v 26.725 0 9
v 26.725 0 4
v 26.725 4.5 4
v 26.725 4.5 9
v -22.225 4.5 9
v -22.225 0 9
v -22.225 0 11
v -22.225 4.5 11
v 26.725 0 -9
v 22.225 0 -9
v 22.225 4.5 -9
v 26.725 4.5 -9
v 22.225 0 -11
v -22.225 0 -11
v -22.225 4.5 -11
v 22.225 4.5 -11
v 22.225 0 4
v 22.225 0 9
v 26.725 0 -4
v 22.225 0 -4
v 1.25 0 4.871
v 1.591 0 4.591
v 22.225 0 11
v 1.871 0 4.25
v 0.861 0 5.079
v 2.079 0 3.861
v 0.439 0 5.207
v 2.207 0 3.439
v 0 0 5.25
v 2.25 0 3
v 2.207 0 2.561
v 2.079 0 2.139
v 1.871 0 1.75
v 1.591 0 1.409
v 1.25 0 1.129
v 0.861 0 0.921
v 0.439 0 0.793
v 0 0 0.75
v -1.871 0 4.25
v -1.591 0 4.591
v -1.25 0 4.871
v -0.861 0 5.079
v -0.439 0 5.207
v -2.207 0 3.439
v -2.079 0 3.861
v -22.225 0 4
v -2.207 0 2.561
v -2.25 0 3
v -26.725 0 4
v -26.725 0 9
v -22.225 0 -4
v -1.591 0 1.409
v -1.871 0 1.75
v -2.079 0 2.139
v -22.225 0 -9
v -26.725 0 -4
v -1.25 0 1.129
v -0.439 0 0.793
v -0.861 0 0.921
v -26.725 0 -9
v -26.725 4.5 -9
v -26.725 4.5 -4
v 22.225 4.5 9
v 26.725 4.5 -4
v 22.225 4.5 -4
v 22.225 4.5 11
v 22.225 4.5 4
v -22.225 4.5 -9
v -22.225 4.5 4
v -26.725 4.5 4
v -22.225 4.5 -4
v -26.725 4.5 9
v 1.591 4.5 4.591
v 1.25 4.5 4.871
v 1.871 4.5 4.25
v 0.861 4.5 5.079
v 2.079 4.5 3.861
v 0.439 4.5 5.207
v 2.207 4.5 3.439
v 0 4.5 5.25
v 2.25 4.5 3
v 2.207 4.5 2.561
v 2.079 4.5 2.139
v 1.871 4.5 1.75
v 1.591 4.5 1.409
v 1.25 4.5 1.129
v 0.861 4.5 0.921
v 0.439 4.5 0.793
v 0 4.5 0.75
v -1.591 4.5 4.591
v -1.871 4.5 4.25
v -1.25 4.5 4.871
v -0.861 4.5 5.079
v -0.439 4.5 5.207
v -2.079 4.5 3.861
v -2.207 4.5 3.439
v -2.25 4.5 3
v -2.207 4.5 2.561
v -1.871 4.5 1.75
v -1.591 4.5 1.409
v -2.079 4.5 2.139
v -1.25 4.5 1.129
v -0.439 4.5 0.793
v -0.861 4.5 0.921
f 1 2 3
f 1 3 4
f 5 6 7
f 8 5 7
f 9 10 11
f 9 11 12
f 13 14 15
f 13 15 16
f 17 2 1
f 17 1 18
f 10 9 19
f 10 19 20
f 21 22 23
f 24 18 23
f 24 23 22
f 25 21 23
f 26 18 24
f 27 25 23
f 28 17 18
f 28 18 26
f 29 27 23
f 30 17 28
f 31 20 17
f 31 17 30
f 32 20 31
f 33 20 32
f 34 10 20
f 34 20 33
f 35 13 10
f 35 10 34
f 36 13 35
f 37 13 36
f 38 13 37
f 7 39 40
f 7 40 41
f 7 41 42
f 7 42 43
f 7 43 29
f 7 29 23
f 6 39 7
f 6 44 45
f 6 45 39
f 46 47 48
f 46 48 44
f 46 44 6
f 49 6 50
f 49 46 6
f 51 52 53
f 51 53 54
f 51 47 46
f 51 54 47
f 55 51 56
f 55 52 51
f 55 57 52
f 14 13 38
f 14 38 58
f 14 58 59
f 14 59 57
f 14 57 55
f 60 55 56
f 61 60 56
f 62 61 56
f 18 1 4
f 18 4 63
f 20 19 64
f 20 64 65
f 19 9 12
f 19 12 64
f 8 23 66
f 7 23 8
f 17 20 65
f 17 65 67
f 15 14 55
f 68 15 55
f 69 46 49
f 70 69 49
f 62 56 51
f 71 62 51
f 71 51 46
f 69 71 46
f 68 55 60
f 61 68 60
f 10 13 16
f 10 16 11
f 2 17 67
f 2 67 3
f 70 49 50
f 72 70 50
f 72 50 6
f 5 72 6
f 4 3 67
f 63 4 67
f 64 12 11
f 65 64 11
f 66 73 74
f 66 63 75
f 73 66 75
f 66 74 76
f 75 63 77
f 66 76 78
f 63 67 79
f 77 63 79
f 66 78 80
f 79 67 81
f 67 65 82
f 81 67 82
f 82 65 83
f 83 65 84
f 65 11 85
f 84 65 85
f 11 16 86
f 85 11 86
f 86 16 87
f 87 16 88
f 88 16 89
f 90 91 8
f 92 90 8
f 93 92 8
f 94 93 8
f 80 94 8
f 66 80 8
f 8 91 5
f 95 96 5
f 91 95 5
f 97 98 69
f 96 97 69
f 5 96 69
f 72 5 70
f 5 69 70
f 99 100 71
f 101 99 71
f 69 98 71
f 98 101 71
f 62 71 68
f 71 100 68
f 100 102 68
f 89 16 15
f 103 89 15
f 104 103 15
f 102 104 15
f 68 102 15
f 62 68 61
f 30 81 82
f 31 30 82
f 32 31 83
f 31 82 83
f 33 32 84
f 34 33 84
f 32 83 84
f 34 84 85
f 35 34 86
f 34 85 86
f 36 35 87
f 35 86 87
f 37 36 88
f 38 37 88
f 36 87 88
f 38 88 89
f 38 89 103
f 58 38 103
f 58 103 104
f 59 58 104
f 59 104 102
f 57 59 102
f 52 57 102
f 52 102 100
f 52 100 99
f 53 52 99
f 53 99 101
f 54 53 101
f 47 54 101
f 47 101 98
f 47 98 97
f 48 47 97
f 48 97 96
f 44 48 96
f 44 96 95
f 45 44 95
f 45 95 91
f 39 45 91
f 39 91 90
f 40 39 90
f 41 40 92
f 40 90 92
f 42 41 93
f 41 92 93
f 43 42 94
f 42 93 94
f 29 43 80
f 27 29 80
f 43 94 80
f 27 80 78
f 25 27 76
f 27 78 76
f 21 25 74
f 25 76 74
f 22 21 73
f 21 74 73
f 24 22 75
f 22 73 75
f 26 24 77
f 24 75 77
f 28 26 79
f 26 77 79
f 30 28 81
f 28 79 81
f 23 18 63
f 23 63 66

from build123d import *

# Parameters (mm, degrees)
BOSS_EXTRUDE1_DEPTH = 4.5
SKETCH2_R           = 2.25
CUT_EXTRUDE1_DEPTH  = 5.5


with BuildPart() as part:
    # Sketch1 → Boss-Extrude1 (new body)
    with BuildSketch(Plane(origin=(0, 0, 0), x_dir=(1, 0, 0), z_dir=(0, 1, 0))):
        Polygon((-22.225, -9), (-22.225, -11), (0, -11), (0, 11), (-22.225, 11), (-22.225, 9), (-26.725, 9), (-26.725, 4), (-22.225, 4), (-22.225, -4), (-26.725, -4), (-26.725, -9), align=None)
    boss_extrude1 = extrude(amount=BOSS_EXTRUDE1_DEPTH)

    # Mirror1: Boss-Extrude1 across plane
    add(boss_extrude1.mirror(Plane(origin=(0, 4.5, -11), x_dir=(0, 0, 1), z_dir=(-1, 0, 0))))

    # Sketch2 → Cut-Extrude1 (cut, through all)
    with BuildSketch(Plane(origin=(0, 4.5, 0), x_dir=(1, 0, 0), z_dir=(0, 1, 0))):
        with Locations((0, -3)):
            Circle(SKETCH2_R)
    extrude(amount=-CUT_EXTRUDE1_DEPTH, mode=Mode.SUBTRACT)


solid = part.part
